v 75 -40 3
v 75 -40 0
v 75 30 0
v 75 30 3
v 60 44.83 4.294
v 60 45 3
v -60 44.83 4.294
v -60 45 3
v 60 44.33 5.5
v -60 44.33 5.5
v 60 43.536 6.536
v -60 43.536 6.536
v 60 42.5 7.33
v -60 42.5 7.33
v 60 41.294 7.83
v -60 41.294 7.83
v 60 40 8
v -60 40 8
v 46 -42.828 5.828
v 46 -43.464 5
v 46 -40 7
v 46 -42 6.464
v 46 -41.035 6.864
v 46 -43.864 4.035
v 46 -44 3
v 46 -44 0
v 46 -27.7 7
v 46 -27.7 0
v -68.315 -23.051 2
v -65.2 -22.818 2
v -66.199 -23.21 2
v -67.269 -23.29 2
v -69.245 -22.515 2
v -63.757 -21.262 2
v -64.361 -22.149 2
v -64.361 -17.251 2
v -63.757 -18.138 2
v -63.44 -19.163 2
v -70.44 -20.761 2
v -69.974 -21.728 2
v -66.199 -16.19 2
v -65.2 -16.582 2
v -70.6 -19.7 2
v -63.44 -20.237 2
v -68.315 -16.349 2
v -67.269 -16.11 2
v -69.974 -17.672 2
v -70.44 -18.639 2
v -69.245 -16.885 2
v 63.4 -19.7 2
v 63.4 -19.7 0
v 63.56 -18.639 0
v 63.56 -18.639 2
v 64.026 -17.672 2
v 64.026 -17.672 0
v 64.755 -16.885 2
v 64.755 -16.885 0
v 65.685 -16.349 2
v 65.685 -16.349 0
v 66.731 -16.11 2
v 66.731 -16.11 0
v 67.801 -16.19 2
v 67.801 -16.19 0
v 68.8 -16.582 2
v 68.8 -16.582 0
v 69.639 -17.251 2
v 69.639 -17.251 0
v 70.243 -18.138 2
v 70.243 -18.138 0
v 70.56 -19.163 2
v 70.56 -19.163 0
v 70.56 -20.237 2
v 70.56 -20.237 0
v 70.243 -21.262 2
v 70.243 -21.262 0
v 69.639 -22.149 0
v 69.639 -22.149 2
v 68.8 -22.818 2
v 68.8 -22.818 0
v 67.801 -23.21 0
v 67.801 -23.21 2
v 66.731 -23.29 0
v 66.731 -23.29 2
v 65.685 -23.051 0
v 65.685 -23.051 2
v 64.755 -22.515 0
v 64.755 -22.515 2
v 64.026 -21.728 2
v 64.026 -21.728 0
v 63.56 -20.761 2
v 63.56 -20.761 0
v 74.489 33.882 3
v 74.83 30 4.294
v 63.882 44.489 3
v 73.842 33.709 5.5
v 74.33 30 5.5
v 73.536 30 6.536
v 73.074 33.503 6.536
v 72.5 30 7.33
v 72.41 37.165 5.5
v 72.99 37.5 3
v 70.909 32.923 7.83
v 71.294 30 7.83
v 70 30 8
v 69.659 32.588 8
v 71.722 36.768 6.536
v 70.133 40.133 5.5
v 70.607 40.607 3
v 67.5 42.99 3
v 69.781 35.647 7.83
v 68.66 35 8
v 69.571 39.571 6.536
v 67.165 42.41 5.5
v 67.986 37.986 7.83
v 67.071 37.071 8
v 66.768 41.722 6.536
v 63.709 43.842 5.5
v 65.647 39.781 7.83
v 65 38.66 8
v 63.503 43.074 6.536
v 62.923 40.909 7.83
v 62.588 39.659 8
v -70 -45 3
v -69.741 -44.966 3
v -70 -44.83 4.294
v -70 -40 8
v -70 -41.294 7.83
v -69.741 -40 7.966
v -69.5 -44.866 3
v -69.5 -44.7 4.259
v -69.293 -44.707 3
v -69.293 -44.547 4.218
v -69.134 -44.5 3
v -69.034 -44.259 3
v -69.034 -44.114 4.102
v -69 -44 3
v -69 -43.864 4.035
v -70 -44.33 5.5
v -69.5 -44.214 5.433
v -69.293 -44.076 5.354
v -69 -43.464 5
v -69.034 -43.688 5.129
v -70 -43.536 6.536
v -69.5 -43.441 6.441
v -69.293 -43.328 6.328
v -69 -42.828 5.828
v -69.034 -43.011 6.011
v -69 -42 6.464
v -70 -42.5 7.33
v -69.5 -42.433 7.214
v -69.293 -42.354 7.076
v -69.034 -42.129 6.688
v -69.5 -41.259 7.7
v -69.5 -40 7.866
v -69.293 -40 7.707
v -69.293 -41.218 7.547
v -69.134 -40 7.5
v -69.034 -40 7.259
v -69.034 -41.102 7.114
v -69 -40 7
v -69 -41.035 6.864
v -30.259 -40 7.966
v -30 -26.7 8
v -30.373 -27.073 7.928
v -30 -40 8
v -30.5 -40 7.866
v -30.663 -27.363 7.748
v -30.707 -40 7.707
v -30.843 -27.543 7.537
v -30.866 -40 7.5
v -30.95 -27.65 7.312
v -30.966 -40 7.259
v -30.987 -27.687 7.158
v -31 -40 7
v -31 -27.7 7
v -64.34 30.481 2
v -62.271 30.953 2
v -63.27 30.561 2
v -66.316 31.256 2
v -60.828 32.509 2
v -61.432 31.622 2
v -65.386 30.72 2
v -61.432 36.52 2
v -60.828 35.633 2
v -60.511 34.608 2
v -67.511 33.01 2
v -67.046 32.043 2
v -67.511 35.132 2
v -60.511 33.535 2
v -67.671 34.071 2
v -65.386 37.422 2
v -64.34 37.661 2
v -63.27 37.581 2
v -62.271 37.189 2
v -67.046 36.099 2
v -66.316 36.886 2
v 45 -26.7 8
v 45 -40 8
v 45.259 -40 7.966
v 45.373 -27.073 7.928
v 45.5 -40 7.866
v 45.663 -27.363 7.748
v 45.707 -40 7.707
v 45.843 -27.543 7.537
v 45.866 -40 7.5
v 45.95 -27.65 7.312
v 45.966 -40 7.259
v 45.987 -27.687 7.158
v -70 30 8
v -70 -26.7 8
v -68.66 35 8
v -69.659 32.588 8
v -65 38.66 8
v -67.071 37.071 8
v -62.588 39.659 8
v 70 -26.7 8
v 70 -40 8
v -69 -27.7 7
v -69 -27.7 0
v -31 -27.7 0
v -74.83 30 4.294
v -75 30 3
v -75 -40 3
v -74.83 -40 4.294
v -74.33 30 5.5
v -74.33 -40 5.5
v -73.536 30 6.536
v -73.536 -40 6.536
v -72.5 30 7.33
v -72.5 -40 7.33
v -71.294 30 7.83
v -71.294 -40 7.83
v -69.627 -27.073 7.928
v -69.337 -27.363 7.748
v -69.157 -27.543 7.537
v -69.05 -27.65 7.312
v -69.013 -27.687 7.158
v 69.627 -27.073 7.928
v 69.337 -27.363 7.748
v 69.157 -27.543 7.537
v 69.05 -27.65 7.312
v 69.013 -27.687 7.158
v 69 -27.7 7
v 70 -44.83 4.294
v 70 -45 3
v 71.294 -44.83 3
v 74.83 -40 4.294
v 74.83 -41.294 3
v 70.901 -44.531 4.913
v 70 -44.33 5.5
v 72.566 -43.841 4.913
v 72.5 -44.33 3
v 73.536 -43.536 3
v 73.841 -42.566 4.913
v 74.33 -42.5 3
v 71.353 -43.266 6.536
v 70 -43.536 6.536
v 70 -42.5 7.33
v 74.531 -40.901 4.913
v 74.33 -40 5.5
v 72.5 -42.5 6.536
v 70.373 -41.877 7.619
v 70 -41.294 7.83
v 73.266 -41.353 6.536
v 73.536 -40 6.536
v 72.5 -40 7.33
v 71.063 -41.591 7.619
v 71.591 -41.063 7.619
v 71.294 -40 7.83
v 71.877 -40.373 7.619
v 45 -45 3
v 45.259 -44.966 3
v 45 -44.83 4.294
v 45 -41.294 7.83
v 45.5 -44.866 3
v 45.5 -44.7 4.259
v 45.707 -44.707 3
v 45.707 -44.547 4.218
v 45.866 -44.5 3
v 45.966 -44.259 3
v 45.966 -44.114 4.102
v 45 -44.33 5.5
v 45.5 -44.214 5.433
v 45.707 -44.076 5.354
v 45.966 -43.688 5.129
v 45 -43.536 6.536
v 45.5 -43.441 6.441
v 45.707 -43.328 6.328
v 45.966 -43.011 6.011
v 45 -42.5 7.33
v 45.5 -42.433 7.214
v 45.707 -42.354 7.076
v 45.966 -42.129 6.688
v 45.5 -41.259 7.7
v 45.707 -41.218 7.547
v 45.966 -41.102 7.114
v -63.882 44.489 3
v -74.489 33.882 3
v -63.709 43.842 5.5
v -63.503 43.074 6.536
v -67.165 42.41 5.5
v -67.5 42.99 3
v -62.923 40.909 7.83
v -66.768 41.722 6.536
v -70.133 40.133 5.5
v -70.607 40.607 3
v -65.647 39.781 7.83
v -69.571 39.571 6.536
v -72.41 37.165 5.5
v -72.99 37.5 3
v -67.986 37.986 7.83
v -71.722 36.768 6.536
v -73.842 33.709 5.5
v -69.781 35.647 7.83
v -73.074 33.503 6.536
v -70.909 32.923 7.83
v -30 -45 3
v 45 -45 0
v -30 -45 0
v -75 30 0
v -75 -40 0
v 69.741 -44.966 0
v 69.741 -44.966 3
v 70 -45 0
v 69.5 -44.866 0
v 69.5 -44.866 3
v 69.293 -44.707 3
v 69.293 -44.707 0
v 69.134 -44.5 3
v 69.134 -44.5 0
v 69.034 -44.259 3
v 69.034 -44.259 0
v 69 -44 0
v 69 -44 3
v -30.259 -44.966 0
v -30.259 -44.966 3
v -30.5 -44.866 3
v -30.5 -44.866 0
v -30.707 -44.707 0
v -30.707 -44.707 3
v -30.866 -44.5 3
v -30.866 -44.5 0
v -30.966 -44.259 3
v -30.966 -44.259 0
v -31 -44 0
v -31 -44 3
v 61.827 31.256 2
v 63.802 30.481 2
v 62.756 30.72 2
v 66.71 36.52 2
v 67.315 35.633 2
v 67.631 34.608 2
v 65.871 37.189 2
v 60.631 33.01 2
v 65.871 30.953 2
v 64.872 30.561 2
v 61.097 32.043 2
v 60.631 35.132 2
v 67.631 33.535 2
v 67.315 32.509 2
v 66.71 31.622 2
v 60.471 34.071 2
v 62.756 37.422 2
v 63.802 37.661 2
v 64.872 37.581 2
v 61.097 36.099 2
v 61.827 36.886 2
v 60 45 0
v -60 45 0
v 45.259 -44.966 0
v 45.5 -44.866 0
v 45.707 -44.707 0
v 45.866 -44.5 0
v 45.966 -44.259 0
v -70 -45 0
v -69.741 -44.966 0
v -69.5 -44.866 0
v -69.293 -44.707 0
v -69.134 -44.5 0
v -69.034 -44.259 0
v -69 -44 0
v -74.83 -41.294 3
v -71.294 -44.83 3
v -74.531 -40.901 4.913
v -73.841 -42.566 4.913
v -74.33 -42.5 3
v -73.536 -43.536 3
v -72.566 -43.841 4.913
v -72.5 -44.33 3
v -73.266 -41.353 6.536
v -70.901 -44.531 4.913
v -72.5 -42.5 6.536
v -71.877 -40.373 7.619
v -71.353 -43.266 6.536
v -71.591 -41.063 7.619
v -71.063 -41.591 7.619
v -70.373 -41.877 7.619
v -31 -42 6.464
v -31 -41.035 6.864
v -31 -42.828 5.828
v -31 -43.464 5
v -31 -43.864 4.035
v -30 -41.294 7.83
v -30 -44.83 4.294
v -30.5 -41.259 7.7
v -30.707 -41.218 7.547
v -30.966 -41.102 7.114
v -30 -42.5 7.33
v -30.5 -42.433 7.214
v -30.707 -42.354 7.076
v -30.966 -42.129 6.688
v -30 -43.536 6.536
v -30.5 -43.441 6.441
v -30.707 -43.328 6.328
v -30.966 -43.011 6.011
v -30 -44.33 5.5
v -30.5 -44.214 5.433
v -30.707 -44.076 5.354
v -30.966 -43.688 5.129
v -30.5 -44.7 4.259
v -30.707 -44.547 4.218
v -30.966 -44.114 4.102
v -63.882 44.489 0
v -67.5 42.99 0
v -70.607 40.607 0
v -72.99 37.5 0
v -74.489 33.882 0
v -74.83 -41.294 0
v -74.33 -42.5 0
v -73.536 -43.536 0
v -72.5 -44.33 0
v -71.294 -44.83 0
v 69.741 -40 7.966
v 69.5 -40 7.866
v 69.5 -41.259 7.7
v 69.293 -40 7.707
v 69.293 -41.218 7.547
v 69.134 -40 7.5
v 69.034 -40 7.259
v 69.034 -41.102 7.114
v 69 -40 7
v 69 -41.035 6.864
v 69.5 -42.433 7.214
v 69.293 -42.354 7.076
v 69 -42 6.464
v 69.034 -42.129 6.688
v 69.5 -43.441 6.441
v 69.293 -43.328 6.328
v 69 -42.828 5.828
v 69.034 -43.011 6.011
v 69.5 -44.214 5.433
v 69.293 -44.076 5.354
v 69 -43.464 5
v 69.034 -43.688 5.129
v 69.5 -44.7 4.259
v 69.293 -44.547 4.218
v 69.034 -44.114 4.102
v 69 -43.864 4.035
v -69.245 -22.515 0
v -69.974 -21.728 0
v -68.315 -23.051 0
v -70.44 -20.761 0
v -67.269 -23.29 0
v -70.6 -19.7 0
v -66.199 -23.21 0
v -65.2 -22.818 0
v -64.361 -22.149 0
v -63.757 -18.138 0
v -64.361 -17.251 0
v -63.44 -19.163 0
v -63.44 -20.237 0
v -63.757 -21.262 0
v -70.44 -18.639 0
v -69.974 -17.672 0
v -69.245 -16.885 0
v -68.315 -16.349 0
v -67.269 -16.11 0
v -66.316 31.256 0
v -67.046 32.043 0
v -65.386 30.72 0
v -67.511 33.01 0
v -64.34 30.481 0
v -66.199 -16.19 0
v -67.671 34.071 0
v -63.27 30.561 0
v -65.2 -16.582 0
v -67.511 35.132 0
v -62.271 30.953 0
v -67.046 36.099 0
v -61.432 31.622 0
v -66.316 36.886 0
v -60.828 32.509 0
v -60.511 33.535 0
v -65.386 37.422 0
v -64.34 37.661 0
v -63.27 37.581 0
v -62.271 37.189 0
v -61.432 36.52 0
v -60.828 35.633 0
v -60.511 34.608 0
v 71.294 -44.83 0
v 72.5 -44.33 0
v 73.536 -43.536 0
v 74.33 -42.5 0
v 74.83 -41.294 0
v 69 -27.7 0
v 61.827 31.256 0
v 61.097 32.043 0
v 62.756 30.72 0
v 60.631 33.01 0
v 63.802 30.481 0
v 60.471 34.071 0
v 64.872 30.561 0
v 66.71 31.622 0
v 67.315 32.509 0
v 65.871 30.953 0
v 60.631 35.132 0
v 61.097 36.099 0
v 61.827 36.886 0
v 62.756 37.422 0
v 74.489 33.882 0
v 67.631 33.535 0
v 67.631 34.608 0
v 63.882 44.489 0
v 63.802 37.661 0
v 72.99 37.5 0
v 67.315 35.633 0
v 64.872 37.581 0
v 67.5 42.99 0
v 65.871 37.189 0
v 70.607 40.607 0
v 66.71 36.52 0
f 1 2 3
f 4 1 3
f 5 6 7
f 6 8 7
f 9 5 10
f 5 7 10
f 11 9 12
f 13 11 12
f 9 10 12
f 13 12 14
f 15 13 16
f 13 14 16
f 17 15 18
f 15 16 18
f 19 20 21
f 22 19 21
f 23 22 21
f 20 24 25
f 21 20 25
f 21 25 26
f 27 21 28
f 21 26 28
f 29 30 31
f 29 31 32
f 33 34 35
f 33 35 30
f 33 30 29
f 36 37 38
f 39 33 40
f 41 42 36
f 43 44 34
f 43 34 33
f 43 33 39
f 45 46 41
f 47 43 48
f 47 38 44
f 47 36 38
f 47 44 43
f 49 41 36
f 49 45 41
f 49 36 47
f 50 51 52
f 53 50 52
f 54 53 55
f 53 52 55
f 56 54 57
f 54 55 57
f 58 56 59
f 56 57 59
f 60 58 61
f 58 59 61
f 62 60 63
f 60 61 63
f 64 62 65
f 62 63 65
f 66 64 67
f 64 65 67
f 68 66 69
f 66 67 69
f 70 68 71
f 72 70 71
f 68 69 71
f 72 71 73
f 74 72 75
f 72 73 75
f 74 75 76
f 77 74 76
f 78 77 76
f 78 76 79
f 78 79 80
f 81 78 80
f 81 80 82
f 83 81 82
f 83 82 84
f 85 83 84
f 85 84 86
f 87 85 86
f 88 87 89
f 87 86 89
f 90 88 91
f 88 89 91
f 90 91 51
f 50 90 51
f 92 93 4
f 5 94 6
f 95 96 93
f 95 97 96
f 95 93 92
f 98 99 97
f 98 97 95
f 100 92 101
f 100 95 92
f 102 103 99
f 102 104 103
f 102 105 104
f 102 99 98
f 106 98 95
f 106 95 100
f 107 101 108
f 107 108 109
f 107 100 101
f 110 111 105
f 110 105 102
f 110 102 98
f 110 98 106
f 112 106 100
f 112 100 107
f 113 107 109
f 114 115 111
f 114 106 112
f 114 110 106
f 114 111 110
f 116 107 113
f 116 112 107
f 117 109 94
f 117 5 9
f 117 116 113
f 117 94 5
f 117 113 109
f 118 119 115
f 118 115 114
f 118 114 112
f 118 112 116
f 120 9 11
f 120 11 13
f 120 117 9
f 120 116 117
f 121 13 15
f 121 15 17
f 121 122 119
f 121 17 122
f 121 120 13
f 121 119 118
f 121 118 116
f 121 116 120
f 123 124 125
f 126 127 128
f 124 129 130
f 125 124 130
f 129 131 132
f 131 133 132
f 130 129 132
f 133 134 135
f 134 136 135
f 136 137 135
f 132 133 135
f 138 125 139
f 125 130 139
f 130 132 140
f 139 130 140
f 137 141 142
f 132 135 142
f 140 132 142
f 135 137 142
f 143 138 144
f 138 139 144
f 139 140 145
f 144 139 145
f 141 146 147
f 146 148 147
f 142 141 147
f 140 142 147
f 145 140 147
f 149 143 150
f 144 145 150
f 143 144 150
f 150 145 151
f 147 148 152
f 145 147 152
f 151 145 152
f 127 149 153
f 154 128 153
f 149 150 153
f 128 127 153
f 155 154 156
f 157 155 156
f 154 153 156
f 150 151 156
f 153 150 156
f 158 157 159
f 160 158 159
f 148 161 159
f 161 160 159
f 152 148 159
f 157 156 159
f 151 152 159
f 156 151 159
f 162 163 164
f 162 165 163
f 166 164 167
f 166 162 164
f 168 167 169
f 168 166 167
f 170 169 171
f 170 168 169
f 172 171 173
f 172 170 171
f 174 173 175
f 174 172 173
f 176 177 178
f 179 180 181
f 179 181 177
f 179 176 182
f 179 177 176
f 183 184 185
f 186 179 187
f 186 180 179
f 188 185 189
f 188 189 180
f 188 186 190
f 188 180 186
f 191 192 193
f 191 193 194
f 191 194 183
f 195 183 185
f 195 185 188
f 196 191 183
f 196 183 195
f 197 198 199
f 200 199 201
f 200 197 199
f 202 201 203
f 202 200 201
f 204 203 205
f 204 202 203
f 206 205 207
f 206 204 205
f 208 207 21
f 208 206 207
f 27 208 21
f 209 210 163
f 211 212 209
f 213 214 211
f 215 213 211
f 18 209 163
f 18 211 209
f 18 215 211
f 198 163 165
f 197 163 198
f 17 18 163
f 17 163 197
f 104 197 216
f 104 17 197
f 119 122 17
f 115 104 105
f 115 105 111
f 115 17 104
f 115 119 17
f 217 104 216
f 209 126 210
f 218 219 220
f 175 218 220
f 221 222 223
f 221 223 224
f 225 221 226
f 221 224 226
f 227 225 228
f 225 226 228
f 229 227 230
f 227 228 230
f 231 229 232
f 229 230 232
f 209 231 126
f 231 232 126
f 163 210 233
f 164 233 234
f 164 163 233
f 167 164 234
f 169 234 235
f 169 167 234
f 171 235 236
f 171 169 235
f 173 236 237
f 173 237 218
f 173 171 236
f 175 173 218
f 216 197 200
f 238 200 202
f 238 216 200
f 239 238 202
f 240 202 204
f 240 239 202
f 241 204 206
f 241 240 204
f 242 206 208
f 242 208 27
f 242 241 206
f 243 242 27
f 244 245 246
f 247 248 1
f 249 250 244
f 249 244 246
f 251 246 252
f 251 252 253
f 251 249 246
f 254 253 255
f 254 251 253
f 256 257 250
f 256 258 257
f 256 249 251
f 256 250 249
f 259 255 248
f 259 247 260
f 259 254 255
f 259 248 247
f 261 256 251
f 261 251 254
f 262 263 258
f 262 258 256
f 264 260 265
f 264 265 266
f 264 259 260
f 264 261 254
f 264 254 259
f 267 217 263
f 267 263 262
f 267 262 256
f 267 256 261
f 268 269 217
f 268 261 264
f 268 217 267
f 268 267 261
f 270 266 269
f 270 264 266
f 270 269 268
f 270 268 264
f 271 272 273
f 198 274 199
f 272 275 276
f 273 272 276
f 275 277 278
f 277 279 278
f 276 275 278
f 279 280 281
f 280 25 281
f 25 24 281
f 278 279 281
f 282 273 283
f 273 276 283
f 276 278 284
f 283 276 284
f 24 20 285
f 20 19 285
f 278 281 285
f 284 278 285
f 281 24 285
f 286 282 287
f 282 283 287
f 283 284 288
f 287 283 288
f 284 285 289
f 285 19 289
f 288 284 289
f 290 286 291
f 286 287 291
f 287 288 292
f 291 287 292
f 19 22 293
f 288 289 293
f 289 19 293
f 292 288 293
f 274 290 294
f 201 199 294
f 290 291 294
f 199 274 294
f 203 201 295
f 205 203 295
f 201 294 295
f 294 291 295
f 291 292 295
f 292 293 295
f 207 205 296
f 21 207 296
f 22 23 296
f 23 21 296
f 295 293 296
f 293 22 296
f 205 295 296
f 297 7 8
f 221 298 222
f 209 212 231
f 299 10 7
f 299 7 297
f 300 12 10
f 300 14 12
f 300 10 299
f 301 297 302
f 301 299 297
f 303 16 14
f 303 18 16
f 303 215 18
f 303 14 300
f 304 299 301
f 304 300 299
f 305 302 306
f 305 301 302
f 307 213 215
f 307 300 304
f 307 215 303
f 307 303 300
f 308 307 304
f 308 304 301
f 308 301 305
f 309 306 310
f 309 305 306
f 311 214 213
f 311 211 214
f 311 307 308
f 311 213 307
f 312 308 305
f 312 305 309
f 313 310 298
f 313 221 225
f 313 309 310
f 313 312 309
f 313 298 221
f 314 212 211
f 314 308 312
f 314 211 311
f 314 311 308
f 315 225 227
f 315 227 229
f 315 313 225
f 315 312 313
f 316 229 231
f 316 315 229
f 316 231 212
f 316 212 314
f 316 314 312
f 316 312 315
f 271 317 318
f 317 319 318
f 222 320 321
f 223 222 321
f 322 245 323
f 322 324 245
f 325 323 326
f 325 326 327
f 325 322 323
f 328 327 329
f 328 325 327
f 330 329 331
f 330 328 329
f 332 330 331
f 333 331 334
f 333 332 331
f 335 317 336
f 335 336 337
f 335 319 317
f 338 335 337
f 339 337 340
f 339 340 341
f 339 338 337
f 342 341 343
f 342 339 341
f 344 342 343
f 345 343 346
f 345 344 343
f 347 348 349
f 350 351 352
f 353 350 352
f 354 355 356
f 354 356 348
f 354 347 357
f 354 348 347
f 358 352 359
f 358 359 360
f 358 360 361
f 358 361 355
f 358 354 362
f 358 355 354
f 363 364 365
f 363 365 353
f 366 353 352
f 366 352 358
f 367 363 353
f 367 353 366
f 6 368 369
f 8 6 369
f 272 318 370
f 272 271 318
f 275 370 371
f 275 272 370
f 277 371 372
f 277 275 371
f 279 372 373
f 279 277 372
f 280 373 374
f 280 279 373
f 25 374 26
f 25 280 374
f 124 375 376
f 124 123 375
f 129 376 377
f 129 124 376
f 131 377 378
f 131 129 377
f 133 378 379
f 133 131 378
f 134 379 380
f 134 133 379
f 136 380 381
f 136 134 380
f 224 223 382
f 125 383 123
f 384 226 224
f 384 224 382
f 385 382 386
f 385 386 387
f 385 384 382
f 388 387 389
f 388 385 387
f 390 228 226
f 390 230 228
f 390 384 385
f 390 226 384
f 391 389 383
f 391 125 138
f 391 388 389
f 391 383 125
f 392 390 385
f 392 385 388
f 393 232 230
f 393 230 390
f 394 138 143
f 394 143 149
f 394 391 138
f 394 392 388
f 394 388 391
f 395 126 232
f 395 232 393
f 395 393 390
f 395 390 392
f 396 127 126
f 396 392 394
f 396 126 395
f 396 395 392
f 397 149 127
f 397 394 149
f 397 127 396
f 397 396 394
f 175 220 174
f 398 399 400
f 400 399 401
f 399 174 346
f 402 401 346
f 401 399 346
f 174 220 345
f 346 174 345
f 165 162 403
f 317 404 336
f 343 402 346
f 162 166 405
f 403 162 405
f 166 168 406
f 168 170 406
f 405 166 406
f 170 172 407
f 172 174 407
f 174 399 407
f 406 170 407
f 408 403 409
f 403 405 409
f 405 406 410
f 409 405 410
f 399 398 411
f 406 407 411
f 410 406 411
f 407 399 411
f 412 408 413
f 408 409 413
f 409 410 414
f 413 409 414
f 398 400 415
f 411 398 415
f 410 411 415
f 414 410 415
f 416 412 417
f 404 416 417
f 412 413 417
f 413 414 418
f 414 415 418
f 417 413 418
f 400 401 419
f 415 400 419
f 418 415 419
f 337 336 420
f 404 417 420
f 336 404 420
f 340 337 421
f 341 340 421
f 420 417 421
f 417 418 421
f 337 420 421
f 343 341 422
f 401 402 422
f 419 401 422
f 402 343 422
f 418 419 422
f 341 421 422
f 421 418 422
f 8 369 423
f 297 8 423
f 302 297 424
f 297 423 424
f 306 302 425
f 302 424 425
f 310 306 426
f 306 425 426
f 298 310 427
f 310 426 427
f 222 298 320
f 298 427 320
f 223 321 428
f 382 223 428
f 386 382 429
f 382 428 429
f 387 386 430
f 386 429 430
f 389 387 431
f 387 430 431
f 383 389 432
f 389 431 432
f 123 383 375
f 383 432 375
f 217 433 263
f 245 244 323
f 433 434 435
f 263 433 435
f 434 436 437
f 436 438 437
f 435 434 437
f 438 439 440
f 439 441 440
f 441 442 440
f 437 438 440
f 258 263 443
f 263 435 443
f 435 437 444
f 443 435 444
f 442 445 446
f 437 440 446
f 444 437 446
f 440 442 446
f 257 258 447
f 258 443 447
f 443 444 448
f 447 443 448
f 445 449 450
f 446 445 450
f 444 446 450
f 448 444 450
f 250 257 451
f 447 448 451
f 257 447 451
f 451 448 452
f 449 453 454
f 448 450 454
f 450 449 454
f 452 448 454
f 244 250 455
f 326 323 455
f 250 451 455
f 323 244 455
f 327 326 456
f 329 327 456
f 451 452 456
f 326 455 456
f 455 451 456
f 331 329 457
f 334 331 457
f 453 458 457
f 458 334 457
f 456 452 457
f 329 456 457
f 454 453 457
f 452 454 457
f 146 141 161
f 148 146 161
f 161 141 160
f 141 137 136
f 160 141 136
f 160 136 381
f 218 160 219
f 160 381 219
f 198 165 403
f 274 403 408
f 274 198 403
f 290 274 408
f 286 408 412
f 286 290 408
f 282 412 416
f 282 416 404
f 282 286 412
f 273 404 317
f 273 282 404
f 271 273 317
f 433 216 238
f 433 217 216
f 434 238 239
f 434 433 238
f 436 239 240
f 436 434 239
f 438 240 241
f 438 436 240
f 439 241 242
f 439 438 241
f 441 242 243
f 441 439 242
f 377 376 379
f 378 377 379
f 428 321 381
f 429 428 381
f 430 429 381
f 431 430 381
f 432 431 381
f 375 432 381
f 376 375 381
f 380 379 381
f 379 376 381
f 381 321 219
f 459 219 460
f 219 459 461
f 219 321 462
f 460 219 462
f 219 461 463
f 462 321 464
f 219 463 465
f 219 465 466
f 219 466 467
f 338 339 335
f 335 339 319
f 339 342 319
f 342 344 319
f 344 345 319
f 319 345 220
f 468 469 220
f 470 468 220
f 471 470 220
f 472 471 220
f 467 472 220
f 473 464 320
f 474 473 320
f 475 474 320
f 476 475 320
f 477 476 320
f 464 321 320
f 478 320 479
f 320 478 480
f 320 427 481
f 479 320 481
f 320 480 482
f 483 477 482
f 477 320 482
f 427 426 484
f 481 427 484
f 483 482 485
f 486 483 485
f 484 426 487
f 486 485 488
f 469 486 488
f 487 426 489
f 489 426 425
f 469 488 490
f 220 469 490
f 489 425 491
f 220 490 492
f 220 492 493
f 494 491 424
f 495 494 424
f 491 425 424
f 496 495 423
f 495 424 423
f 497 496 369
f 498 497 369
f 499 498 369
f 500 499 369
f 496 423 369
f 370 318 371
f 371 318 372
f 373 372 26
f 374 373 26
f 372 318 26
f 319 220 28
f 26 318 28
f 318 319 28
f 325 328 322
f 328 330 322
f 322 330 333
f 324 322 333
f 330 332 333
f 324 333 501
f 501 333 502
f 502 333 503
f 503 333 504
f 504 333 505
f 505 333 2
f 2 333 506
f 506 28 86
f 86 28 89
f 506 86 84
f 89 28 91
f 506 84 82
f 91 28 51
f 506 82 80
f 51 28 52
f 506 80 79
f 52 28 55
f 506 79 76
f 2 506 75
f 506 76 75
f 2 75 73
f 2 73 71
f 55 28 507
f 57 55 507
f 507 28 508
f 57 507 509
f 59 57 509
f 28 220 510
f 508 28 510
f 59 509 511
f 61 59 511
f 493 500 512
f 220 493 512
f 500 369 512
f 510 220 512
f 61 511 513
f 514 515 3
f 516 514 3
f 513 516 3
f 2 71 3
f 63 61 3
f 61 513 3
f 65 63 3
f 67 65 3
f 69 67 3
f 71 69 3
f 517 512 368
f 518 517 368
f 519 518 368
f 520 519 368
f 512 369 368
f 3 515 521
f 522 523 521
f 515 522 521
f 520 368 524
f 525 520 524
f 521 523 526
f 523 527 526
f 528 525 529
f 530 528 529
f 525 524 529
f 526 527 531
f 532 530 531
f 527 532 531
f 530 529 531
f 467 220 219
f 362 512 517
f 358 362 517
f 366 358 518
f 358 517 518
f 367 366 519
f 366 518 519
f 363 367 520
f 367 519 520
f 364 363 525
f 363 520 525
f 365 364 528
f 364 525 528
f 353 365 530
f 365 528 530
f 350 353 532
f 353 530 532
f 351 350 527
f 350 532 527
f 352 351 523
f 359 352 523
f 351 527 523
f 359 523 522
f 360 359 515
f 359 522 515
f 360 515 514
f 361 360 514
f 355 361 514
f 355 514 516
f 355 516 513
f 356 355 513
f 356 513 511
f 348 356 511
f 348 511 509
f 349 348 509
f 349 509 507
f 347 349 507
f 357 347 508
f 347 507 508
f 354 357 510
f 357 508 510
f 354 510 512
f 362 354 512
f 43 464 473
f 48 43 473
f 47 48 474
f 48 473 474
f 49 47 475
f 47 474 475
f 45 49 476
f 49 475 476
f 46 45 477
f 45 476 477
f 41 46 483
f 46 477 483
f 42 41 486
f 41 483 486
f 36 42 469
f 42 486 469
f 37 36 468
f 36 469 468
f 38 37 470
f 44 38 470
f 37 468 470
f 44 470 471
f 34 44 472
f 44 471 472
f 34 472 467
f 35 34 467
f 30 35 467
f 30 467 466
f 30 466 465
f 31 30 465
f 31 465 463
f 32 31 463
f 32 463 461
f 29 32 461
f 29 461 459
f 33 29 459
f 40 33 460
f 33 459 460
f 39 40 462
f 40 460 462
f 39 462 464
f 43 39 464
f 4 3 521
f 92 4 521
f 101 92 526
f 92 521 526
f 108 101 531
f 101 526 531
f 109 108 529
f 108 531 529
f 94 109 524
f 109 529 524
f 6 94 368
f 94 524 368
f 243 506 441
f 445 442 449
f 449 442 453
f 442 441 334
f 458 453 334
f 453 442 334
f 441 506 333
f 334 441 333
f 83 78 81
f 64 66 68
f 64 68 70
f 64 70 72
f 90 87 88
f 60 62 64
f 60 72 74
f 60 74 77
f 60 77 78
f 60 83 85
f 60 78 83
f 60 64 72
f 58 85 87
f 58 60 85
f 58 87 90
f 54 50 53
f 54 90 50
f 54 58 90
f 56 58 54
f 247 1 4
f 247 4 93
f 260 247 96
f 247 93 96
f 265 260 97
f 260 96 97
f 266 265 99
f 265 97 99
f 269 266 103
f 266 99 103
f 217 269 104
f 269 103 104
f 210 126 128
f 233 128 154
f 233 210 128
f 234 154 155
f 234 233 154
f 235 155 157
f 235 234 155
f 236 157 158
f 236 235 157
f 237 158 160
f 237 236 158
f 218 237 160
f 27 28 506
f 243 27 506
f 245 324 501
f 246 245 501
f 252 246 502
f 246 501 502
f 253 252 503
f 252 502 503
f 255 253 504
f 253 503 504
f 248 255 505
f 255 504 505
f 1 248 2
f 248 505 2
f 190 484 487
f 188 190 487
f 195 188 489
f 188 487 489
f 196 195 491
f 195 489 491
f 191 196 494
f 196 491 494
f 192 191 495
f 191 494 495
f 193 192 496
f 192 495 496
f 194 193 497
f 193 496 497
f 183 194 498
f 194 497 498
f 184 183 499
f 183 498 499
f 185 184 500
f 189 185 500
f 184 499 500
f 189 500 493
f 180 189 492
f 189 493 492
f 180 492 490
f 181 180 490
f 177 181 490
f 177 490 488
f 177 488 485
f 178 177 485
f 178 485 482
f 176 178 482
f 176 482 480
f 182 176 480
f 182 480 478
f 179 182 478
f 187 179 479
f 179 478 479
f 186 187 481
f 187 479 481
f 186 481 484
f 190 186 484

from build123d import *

# Parameters (mm, degrees)
SALIENTE_EXTRUIR1_DEPTH = 8
REDONDEO1_R             = 5
REDONDEO2_R             = 5
REDONDEO3_R             = 1
CROQUIS2_R              = 3.6
CORTAR_EXTRUIR1_DEPTH   = 2


with BuildPart() as part:
    # Croquis1 → Saliente-Extruir1 (new body)
    with BuildSketch(Plane.XY):
        with BuildLine():
            Line((69, -45), (70, -45))
            ThreePointArc((70, -45), (73.535533906, -43.535533906), (75, -40))
            Line((75, -40), (75, 30))
            ThreePointArc((75, 30), (70.606601718, 40.606601718), (60, 45))
            Line((60, 45), (-60, 45))
            ThreePointArc((-60, 45), (-70.606601718, 40.606601718), (-75, 30))
            Line((-75, 30), (-75, -40))
            ThreePointArc((-75, -40), (-73.535533906, -43.535533906), (-70, -45))
            Line((-70, -45), (-69, -45))
            Line((-69, -45), (-69, -27.7))
            Line((-69, -27.7), (-31, -27.7))
            Line((-31, -27.7), (-31, -45))
            Line((-31, -45), (46, -45))
            Line((46, -45), (46, -27.7))
            Line((46, -27.7), (69, -27.7))
            Line((69, -27.7), (69, -45))
        make_face()
    extrude(amount=SALIENTE_EXTRUIR1_DEPTH)

    # Redondeo1
    redondeo1_edges = [part.edges().sort_by_distance(p)[0] for p in [
        (73.535533906, -43.535533906, 8),
        (75, -5, 8),
        (70.606601718, 40.606601718, 8),
        (0, 45, 8),
        (-70.606601718, 40.606601718, 8),
        (-75, -5, 8),
        (-73.535533906, -43.535533906, 8),
        (-69.5, -45, 8),
        (69.5, -45, 8),
    ]]
    fillet(redondeo1_edges, radius=REDONDEO1_R)

    # Redondeo2
    redondeo2_edges = [part.edges().sort_by_distance(p)[0] for p in [
        (7.5, -45, 8),
    ]]
    fillet(redondeo2_edges, radius=REDONDEO2_R)

    # Redondeo3
    redondeo3_edges = [part.edges().sort_by_distance(p)[0] for p in [
        (-69, -33.85, 8),
        (-50, -27.7, 8),
        (69, -33.85, 8),
        (69, -45, 1.5),
        (69, -43.535533906, 6.535533906),
        (-31, -33.85, 8),
        (-69, -45, 1.5),
        (-69, -43.535533906, 6.535533906),
        (57.5, -27.7, 8),
        (46, -33.85, 8),
        (46, -45, 1.5),
        (-31, -45, 1.5),
        (-31, -43.535533906, 6.535533906),
        (46, -43.535533906, 6.535533906),
    ]]
    fillet(redondeo3_edges, radius=REDONDEO3_R - 0.0001)  # a hair under: the kernel refuses the full size

    # Croquis2 → Cortar-Extruir1 (cut)
    with BuildSketch(Plane(origin=(0, 0, 0), x_dir=(-1, 0, 0), z_dir=(0, 0, -1))):
        with Locations((67, -19.7)):
            Circle(CROQUIS2_R)
        with Locations((64.071067812, 34.071067812)):
            Circle(CROQUIS2_R)
        with Locations((-67, -19.7)):
            Circle(CROQUIS2_R)
        with Locations((-64.071067812, 34.071067812)):
            Circle(CROQUIS2_R)
    extrude(amount=-CORTAR_EXTRUIR1_DEPTH, mode=Mode.SUBTRACT)


solid = part.part
